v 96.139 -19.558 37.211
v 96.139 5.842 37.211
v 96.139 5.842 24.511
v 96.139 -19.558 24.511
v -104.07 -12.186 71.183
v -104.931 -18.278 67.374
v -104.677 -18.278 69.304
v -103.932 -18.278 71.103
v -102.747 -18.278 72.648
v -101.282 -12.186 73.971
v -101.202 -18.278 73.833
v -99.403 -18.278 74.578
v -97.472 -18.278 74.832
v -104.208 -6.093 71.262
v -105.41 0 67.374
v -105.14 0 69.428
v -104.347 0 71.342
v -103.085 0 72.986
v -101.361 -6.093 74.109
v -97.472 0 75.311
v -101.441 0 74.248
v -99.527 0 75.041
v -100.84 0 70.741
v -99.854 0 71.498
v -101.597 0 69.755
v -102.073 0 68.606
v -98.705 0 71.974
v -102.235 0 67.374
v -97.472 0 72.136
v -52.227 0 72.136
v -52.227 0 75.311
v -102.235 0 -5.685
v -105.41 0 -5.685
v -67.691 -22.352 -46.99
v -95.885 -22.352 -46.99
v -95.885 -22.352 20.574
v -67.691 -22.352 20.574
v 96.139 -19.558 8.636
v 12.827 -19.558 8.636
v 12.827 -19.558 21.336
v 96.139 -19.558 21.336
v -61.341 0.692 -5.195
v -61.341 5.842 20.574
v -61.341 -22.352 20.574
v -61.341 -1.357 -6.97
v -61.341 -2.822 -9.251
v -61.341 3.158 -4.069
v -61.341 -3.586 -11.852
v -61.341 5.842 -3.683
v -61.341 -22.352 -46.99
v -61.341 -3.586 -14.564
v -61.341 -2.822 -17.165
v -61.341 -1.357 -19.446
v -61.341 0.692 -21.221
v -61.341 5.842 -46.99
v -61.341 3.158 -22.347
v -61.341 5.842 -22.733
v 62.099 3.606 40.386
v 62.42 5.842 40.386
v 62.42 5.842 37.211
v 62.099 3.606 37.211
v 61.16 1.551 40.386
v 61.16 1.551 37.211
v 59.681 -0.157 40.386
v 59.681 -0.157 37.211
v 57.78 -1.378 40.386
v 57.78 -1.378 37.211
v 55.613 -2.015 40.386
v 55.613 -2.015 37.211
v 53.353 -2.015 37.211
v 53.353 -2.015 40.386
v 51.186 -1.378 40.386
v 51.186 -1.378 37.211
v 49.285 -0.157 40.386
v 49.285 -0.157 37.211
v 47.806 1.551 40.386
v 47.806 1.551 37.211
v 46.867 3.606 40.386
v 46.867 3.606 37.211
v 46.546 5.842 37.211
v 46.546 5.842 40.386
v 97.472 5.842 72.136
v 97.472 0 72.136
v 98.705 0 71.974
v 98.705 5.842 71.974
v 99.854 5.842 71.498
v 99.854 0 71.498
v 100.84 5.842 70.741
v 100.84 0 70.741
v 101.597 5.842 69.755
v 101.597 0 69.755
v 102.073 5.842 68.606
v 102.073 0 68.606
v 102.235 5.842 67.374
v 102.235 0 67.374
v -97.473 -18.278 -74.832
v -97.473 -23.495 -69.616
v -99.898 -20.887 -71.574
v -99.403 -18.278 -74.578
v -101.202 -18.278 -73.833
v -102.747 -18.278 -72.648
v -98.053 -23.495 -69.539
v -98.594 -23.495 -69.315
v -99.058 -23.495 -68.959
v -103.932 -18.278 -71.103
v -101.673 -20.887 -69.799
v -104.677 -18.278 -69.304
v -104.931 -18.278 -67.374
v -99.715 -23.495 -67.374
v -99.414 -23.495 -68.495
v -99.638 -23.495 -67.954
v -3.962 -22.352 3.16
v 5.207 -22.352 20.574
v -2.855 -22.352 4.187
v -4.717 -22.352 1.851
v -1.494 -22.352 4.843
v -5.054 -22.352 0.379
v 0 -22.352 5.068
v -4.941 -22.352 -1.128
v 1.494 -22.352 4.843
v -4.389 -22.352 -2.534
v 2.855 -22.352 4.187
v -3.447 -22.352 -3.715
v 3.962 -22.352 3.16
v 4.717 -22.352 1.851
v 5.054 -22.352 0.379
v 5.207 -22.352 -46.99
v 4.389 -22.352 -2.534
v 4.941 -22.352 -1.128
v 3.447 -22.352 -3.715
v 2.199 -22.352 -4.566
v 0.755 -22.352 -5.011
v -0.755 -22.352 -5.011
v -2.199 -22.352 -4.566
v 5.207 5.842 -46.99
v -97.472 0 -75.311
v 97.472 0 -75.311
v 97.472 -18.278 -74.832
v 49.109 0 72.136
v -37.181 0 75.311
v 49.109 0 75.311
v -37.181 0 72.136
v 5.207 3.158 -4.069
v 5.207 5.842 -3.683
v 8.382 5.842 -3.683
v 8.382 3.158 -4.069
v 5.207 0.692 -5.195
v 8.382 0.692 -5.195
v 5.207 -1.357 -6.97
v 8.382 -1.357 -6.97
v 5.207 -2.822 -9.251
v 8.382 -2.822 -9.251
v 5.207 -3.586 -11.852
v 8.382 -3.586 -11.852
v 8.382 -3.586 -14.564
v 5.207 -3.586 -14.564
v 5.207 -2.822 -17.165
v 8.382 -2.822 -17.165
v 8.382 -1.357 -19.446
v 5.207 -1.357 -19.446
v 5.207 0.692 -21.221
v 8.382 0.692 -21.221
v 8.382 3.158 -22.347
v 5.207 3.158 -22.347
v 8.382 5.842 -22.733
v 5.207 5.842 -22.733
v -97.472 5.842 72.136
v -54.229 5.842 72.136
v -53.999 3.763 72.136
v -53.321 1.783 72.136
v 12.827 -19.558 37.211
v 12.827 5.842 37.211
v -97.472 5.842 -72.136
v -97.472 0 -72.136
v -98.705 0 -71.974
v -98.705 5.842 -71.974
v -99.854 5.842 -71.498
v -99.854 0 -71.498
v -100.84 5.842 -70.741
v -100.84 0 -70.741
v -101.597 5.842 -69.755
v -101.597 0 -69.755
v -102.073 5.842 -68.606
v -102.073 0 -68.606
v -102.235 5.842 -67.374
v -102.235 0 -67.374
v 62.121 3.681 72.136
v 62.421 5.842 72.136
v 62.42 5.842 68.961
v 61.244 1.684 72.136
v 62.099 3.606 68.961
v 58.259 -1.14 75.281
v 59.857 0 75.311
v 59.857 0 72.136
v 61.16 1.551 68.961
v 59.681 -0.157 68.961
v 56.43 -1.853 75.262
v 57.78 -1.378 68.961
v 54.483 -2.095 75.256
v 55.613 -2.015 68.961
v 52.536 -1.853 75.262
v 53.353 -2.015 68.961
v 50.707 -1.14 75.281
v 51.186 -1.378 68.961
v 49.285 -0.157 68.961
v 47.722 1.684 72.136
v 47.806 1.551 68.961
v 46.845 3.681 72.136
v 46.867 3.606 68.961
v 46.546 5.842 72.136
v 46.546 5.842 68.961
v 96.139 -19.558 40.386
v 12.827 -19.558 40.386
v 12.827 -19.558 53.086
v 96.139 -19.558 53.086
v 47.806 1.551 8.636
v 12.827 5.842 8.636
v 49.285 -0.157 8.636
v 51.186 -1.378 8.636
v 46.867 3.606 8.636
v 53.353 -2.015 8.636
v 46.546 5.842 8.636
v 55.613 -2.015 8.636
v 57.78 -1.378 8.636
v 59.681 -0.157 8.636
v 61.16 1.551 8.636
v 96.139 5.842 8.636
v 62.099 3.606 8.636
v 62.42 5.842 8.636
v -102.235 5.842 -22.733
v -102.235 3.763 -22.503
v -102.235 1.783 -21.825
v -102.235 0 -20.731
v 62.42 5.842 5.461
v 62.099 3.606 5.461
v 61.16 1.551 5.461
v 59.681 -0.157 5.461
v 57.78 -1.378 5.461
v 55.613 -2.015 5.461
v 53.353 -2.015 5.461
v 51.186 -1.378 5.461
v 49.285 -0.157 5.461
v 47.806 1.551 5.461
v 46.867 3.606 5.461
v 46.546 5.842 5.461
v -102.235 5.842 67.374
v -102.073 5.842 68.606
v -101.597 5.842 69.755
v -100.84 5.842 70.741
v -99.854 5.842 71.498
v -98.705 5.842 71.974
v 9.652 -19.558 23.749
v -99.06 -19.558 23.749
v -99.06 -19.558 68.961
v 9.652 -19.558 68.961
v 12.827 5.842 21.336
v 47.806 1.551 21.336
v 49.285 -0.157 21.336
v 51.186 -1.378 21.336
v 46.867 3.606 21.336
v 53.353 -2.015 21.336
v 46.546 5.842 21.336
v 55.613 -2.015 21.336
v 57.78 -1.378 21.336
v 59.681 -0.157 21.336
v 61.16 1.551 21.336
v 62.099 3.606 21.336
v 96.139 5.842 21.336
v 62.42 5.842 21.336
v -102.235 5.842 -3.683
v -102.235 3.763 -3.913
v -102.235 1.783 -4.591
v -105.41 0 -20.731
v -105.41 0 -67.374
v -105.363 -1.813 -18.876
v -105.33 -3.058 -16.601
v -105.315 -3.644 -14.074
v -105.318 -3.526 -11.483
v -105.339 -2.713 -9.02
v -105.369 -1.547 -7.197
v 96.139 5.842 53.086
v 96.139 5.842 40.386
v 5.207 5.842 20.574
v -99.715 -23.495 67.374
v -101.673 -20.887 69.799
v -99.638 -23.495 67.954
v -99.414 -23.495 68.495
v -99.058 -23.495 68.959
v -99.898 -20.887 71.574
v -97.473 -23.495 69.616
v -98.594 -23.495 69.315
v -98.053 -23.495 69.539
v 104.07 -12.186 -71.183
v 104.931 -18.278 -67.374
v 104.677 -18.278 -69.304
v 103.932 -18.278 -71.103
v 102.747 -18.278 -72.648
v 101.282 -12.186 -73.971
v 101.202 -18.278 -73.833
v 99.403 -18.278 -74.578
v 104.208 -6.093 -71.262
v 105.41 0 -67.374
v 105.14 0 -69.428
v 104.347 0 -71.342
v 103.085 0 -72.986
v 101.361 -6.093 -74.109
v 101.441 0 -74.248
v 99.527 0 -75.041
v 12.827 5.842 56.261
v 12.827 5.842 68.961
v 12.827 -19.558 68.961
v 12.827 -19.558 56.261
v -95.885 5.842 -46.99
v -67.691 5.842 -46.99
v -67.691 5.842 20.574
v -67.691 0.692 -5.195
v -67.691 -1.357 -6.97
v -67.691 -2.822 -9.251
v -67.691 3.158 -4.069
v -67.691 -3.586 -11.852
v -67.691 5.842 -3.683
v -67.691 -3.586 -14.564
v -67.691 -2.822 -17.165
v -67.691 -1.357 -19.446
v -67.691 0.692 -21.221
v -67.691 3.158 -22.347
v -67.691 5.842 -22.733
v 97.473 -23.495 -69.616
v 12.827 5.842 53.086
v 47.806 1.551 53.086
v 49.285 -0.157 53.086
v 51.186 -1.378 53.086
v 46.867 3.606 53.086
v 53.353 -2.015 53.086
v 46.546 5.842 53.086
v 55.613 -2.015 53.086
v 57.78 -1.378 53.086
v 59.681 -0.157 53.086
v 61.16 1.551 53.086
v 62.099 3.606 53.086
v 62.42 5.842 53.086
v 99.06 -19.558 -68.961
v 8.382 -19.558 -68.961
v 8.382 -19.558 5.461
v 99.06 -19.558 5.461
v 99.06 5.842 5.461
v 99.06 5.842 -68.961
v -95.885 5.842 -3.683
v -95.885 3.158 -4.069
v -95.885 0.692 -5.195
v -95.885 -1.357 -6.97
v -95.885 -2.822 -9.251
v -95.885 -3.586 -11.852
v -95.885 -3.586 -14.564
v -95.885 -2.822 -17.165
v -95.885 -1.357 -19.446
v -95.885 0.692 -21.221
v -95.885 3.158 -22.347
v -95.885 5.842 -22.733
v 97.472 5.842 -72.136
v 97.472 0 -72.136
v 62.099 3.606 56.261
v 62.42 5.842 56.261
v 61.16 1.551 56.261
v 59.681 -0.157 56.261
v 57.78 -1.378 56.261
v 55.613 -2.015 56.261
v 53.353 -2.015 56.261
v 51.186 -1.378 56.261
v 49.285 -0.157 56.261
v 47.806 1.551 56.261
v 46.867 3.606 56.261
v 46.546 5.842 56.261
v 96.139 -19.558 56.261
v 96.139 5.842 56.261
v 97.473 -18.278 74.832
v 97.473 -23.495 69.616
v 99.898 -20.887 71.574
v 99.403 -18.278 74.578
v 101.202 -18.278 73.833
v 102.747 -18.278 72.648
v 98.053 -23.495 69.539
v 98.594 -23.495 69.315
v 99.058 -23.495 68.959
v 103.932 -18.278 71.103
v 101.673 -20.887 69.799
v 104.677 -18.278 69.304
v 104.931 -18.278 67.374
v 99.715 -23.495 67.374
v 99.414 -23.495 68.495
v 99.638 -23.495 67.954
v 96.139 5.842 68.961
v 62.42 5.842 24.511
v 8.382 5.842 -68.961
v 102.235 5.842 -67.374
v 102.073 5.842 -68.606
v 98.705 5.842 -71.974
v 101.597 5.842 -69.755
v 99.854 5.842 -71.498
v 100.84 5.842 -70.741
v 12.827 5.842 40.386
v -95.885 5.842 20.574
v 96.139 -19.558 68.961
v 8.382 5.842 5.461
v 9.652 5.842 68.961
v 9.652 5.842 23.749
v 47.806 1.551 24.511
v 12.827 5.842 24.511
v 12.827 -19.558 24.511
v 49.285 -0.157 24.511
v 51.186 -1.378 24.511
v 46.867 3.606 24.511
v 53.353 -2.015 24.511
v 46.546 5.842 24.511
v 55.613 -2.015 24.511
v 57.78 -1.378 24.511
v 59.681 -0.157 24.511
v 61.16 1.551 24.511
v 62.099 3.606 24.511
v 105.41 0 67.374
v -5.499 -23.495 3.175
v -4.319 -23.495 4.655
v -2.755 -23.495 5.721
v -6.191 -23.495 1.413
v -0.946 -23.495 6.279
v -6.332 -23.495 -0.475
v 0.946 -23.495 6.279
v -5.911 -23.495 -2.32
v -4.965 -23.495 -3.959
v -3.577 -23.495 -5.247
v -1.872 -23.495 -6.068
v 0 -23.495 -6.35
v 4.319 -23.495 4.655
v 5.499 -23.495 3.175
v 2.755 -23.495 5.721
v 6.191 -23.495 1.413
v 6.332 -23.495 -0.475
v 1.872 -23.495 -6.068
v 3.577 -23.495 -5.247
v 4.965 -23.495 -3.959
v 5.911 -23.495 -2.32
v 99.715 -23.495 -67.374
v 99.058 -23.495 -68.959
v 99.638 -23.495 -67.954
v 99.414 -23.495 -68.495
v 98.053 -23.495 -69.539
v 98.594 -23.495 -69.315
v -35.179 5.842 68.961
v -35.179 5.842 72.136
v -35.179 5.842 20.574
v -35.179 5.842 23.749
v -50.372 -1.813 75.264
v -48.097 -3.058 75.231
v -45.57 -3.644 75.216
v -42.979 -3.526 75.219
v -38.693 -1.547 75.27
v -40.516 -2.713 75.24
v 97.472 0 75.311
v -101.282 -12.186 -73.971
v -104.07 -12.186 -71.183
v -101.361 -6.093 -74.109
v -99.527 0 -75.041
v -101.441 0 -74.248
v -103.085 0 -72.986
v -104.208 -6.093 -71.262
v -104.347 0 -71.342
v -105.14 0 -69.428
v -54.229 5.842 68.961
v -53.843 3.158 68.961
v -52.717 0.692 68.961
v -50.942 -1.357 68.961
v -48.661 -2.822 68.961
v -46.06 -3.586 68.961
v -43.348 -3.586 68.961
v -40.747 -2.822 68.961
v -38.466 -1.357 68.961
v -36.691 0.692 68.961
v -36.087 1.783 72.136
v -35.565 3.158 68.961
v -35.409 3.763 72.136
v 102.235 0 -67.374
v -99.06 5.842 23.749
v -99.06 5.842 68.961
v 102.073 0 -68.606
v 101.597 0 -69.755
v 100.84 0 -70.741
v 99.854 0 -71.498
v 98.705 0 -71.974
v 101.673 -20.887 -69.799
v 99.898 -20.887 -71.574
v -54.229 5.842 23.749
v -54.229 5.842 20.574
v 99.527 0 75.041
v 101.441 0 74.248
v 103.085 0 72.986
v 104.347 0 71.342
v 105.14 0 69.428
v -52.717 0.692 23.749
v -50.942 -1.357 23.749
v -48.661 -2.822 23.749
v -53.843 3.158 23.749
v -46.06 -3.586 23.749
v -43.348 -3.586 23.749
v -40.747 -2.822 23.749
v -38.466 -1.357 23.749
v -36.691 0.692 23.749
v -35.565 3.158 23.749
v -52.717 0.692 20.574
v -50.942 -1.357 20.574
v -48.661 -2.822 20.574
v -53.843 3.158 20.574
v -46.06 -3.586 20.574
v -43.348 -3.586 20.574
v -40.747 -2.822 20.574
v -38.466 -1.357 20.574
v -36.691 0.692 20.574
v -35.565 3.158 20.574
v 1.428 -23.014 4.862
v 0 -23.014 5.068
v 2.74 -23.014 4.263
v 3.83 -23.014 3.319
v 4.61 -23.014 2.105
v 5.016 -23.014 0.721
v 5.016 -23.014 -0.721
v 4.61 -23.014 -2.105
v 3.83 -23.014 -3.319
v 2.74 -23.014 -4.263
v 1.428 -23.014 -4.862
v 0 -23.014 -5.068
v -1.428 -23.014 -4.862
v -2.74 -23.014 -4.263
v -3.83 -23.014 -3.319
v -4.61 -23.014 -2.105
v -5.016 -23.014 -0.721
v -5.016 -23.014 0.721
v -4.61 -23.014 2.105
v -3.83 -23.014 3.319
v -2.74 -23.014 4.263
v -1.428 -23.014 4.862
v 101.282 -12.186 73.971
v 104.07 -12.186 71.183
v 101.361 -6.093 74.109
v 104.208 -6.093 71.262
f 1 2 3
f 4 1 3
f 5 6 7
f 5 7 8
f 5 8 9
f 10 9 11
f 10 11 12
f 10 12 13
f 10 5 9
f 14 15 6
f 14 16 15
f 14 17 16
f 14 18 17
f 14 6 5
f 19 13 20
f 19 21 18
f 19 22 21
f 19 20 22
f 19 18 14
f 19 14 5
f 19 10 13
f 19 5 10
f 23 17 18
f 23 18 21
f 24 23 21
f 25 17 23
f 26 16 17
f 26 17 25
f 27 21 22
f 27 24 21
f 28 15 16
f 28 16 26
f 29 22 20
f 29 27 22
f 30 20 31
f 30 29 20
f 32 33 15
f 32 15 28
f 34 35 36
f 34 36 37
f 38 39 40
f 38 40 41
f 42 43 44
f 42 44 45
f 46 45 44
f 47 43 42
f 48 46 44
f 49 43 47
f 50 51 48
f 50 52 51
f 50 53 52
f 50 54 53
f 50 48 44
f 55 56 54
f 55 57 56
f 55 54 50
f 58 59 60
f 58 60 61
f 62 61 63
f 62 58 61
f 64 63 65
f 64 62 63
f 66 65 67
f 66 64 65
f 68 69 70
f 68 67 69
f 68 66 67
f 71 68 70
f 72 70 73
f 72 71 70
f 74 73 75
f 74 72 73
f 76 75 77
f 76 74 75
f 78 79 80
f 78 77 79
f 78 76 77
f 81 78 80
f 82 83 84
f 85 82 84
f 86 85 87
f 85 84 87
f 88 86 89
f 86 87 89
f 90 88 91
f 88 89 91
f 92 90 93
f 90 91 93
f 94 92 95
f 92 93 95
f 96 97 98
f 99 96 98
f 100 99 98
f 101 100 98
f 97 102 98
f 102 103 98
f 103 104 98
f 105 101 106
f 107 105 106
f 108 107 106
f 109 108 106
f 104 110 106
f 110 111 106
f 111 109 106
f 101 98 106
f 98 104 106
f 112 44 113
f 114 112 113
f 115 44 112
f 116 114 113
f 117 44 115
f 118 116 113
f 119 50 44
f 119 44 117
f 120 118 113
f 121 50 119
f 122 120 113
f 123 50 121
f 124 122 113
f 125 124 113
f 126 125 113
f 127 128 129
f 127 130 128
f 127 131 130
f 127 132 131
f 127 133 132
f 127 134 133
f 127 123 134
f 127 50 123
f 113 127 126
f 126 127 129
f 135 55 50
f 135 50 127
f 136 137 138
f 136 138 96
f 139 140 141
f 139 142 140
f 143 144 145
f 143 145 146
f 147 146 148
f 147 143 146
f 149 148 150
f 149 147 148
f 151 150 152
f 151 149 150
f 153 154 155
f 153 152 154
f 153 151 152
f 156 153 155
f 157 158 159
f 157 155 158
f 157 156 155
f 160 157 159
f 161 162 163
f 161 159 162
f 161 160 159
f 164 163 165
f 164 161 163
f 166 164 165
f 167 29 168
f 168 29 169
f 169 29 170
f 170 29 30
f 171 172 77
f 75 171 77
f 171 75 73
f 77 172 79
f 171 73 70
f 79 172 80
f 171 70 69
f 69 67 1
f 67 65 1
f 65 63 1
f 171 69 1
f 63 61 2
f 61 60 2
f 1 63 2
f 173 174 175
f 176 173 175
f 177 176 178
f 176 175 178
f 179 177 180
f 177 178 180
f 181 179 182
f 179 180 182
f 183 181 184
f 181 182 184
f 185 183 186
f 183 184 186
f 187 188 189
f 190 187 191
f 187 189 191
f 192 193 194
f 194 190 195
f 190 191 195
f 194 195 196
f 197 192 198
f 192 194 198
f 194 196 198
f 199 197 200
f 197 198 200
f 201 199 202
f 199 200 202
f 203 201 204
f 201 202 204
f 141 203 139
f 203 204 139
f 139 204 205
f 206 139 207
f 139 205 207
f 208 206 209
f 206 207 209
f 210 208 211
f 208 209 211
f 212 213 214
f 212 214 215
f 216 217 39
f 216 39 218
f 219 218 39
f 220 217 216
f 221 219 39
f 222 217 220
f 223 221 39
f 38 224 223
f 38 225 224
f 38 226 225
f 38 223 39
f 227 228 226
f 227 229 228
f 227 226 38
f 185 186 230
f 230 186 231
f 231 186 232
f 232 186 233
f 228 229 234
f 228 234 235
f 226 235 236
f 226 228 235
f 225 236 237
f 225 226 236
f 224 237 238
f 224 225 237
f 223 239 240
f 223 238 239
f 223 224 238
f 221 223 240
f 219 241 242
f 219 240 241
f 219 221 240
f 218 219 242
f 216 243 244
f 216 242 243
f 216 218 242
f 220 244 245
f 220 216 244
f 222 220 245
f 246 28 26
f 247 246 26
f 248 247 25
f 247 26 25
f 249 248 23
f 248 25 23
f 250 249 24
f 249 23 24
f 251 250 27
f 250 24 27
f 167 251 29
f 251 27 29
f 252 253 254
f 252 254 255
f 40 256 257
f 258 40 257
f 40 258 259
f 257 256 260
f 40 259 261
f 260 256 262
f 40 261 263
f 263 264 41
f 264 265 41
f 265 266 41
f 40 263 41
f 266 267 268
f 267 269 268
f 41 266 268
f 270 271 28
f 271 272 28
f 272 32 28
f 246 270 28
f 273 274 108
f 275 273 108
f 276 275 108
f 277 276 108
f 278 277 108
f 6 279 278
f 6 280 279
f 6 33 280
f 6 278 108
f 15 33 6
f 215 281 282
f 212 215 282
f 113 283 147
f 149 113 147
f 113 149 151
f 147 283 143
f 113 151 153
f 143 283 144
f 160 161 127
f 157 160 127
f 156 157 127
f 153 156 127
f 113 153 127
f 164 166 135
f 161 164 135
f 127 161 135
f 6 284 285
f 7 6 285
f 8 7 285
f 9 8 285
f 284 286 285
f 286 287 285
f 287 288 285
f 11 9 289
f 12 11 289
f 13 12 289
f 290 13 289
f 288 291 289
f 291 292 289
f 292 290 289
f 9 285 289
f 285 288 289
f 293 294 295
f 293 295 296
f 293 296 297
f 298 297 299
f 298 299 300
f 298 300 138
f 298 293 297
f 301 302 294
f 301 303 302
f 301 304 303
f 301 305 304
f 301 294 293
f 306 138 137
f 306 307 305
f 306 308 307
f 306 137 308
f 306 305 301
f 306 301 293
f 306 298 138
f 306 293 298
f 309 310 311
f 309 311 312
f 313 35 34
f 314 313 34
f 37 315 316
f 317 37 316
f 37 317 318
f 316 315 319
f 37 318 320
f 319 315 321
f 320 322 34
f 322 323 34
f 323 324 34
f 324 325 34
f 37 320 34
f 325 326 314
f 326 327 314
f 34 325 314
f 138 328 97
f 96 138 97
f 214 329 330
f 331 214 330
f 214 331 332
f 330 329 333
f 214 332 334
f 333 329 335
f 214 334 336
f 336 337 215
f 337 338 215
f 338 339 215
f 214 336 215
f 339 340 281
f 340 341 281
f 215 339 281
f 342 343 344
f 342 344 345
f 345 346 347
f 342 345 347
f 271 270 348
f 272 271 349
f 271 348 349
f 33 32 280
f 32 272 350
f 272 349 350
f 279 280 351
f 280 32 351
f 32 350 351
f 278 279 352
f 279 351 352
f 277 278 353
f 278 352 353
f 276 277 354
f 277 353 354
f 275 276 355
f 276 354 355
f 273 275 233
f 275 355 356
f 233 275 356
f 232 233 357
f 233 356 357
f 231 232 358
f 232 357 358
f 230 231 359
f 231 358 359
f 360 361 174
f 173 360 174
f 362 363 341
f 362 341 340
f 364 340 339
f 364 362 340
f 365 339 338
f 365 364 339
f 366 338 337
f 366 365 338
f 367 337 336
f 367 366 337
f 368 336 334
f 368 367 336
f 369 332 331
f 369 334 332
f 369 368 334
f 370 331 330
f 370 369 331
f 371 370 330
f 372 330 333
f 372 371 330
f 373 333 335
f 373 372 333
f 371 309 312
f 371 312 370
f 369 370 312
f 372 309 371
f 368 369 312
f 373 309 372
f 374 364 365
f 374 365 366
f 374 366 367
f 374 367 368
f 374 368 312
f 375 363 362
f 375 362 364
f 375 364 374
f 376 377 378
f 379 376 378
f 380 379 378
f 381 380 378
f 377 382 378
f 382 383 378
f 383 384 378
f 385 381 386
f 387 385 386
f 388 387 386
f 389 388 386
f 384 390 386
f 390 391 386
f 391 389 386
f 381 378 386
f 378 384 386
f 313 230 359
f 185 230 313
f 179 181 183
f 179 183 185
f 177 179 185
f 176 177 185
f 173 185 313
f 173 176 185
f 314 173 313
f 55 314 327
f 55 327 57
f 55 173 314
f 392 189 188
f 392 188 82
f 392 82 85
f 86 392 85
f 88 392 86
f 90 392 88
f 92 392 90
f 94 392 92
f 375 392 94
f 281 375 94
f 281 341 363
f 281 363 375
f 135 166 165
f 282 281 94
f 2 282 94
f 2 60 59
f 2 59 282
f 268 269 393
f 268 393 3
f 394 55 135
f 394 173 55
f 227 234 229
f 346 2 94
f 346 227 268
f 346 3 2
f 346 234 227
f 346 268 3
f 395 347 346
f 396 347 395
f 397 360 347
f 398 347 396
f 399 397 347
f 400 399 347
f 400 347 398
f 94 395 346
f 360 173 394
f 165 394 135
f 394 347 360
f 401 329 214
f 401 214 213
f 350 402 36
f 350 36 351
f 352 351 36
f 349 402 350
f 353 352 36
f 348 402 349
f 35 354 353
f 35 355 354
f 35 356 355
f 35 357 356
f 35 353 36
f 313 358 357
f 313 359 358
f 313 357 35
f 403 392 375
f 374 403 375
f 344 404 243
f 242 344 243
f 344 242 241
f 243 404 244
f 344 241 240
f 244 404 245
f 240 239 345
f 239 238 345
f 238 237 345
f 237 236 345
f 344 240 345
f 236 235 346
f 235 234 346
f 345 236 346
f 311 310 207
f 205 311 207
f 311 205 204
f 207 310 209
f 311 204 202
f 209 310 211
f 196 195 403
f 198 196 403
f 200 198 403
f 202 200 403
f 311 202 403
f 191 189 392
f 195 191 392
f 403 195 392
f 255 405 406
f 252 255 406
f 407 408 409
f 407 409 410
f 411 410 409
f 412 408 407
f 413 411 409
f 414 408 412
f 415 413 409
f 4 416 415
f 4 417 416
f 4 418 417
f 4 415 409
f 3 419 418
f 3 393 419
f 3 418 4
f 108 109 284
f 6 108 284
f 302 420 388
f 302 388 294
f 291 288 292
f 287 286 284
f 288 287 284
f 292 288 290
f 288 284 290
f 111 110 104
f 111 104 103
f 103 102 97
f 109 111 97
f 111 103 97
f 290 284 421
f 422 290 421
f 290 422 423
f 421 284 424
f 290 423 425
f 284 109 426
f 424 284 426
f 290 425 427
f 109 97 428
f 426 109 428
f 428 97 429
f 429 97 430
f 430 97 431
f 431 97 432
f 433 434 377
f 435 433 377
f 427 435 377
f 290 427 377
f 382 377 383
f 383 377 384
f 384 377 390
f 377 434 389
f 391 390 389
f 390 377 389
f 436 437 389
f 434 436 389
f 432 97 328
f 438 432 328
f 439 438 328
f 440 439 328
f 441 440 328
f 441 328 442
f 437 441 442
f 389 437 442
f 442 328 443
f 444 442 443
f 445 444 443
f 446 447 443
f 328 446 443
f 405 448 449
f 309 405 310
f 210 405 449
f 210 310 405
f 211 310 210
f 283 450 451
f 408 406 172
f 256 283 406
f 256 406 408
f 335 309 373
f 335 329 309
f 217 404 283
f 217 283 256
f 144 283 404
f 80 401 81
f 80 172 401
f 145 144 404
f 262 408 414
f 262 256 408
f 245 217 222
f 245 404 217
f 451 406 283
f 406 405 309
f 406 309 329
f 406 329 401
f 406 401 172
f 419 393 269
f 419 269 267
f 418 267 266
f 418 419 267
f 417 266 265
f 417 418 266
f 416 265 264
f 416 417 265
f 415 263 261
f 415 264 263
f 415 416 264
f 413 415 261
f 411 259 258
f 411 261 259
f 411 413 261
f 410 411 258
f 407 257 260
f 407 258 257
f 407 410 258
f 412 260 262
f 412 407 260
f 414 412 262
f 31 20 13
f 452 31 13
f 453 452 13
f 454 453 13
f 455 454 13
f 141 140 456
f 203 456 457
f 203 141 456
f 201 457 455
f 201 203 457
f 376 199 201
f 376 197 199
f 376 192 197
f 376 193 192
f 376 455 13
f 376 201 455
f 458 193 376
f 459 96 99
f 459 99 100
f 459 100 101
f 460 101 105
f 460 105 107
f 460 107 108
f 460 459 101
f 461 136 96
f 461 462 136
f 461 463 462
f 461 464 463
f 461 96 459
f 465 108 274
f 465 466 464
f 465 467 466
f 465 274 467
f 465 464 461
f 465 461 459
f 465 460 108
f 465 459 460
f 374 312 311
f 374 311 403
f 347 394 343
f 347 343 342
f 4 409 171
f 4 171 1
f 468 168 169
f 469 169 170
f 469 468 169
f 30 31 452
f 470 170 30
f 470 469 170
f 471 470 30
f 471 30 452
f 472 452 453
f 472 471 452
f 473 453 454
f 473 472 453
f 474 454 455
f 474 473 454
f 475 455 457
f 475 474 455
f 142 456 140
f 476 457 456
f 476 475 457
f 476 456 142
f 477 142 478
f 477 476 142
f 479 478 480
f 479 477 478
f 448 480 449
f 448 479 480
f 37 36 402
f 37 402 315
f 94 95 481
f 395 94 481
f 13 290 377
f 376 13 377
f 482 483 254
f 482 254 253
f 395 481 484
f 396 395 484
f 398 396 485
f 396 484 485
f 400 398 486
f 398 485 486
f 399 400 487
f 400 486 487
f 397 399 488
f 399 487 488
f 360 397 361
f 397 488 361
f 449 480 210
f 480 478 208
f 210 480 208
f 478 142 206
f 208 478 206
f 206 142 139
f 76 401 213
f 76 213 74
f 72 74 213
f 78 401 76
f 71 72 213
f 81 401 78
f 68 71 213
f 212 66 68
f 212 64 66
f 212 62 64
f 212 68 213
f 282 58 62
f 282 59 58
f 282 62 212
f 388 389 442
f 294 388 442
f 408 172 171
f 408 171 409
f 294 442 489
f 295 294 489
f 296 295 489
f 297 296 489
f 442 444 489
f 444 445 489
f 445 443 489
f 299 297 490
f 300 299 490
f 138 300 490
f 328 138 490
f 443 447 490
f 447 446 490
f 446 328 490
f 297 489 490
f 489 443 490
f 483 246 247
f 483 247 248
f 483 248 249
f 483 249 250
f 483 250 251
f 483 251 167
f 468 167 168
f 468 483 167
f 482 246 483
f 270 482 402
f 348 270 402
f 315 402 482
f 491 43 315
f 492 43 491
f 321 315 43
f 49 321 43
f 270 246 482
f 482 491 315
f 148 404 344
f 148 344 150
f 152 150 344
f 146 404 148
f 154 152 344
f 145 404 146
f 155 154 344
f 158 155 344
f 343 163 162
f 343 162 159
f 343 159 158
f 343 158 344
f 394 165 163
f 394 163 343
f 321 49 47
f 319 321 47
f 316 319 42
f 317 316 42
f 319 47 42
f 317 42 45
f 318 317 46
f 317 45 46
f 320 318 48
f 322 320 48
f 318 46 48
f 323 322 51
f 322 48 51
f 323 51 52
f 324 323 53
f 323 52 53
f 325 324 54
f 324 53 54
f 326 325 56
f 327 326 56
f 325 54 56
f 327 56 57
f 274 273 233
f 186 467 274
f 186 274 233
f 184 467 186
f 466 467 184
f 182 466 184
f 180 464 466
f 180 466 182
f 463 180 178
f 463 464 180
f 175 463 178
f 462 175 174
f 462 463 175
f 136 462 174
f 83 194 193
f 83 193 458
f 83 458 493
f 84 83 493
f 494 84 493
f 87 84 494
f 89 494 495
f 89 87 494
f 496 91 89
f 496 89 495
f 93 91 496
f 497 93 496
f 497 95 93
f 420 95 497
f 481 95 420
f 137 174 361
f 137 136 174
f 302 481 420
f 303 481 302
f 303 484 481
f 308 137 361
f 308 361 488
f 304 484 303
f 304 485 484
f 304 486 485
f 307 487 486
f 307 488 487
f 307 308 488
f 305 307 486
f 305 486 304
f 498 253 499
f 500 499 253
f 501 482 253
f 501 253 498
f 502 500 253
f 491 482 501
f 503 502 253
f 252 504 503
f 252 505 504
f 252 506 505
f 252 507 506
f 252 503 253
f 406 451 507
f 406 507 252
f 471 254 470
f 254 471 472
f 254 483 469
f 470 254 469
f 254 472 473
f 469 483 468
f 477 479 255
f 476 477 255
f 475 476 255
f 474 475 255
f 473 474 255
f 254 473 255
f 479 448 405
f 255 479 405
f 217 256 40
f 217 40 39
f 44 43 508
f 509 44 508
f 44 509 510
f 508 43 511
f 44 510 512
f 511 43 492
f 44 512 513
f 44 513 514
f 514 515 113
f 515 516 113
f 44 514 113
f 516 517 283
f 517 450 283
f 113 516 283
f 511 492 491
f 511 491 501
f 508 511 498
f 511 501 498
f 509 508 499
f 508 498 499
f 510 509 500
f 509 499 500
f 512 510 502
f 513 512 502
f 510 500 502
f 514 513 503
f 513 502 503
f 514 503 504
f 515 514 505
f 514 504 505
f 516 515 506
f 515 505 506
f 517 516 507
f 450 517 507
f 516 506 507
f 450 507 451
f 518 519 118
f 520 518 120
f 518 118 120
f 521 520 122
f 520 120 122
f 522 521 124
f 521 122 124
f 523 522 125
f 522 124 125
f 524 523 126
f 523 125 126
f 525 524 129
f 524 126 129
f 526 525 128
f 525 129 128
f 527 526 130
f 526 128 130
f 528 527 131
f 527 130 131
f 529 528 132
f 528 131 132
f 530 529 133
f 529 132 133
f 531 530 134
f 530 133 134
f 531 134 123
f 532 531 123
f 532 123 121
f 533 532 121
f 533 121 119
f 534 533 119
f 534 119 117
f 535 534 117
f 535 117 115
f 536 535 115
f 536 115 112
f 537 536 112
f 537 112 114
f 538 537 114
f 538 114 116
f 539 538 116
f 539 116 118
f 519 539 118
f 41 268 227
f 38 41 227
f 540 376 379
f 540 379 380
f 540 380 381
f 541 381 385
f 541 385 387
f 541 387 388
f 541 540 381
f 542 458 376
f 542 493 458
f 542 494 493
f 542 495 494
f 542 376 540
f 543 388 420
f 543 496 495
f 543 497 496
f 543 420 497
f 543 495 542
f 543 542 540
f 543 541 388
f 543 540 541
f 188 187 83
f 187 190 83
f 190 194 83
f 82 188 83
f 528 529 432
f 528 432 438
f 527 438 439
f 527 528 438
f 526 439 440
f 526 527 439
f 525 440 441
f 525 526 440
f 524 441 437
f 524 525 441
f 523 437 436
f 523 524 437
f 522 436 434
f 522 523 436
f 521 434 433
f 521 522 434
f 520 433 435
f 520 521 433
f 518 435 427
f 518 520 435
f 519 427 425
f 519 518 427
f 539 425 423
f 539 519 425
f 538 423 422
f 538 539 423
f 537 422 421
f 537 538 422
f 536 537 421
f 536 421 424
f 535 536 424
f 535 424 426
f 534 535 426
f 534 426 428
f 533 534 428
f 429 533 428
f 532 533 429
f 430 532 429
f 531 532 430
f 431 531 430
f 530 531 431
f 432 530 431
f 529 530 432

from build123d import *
from OCP.BRepFilletAPI import BRepFilletAPI_MakeChamfer

# Parameters (mm, degrees)
BOSS_EXTRUDE1_DEPTH            = 23.495
BOSS_EXTRUDE1_DRAFT            = -1.5
CHAMFER1_SIZE                  = 5.21838973
CHAMFER1_SIZE_2                = 5.08
BOSS_EXTRUDE2_DEPTH            = 5.842
SKETCH3_W                      = 108.712
SKETCH3_H                      = 45.212
CUT_EXTRUDE1_DEPTH             = 25.4
SKETCH4_R                      = 6.35
CUT_EXTRUDE2_DEPTH             = 1.524
CHAMFER2_SIZE2                 = 4.064
CHAMFER2_SIZE                  = 1.524
SKETCH5_W                      = 28.194
SKETCH5_H                      = 67.564
SKETCH5_W_2                    = 66.548
CUT_EXTRUDE3_DEPTH             = 28.194
SKETCH6_W                      = 83.312
SKETCH6_H                      = 12.7
CUT_EXTRUDE4_DEPTH             = 25.4
LPATTERN2_COUNT                = 4
LPATTERN2_PITCH                = 15.875
SKETCH8_W                      = 90.678
SKETCH8_H                      = 74.422
CUT_EXTRUDE5_DEPTH             = 25.4
CUT_EXTRUDE6_REACH             = 148.547
SKETCH10_R                     = 9.525
CUT_EXTRUDE6_DIRECTION_2_REACH = 148.547
SKETCH11_R                     = 9.525
CUT_EXTRUDE7_DEPTH             = 185.471292474
CUT_EXTRUDE7_DIRECTION_2_REACH = 186.471
CUT_EXTRUDE8_REACH             = 172.219
CUT_EXTRUDE8_DIRECTION_2_DEPTH = 171.218901151
SKETCH12_R                     = 5.067701835
CUT_EXTRUDE9_DEPTH             = 133.581735005


with BuildPart() as part:
    # Sketch1 → Boss-Extrude1 (with draft: the straight prism first)
    with BuildSketch(Plane(origin=(0, 0, 0), x_dir=(1, 0, 0), z_dir=(0, 1, 0))):
        with BuildLine():
            ThreePointArc((-97.4725, 75.311), (-103.085160076, 72.986160076), (-105.41, 67.3735))
            Line((-105.41, 67.3735), (-105.41, -67.3735))
            ThreePointArc((-105.41, -67.3735), (-103.085160076, -72.986160076), (-97.4725, -75.311))
            Line((-97.4725, -75.311), (97.4725, -75.311))
            ThreePointArc((97.4725, -75.311), (103.085160076, -72.986160076), (105.41, -67.3735))
            Line((105.41, -67.3735), (105.41, 67.3735))
            ThreePointArc((105.41, 67.3735), (103.085160076, 72.986160076), (97.4725, 75.311))
            Line((97.4725, 75.311), (-97.4725, 75.311))
        make_face()
    extrude(amount=-BOSS_EXTRUDE1_DEPTH)
    # Boss-Extrude1: the draft: its side faces are tilted about the plane it starts from
    boss_extrude1_sides = [part.faces().sort_by_distance(p)[0] for p in [
        (-103.085160076, -11.7475, -72.986160076),
        (-105.41, -11.7475, 0),
        (-103.085160076, -11.7475, 72.986160076),
        (0, -11.7475, 75.311),
        (103.085160076, -11.7475, 72.986160076),
        (105.41, -11.7475, 0),
        (103.085160076, -11.7475, -72.986160076),
        (0, -11.7475, -75.311),
    ]]
    draft(boss_extrude1_sides, Plane(origin=(0, 0, 0), x_dir=(1, 0, 0), z_dir=(0, 1, 0)), BOSS_EXTRUDE1_DRAFT)

    # Chamfer1
    chamfer1_edges_1 = [part.edges().sort_by_distance(p)[0] for p in [
        (-102.650120953, -23.495, -72.551120953),
    ]]
    chamfer1_side_1 = [part.faces().sort_by_distance(p)[0] for p in [
        (-102.652001559, -23.393434816, -72.553001559),
    ]]
    chamfer1_edges_2 = [part.edges().sort_by_distance(p)[0] for p in [
        (-104.794761773, -23.495, 0),
    ]]
    chamfer1_side_2 = [part.faces().sort_by_distance(p)[0] for p in [
        (-104.797421351, -23.393434816, 0),
    ]]
    chamfer1_edges_3 = [part.edges().sort_by_distance(p)[0] for p in [
        (-102.650120953, -23.495, 72.551120953),
    ]]
    chamfer1_side_3 = [part.faces().sort_by_distance(p)[0] for p in [
        (-102.652001559, -23.393434816, 72.553001559),
    ]]
    chamfer1_edges_4 = [part.edges().sort_by_distance(p)[0] for p in [
        (0, -23.495, 74.695761773),
    ]]
    chamfer1_side_4 = [part.faces().sort_by_distance(p)[0] for p in [
        (0, -23.393434816, 74.698421351),
    ]]
    chamfer1_edges_5 = [part.edges().sort_by_distance(p)[0] for p in [
        (102.650120953, -23.495, 72.551120953),
    ]]
    chamfer1_side_5 = [part.faces().sort_by_distance(p)[0] for p in [
        (102.652001559, -23.393434816, 72.553001559),
    ]]
    chamfer1_edges_6 = [part.edges().sort_by_distance(p)[0] for p in [
        (104.794761773, -23.495, 0),
    ]]
    chamfer1_side_6 = [part.faces().sort_by_distance(p)[0] for p in [
        (104.797421351, -23.393434816, 0),
    ]]
    chamfer1_edges_7 = [part.edges().sort_by_distance(p)[0] for p in [
        (102.650120953, -23.495, -72.551120953),
    ]]
    chamfer1_side_7 = [part.faces().sort_by_distance(p)[0] for p in [
        (102.652001559, -23.393434816, -72.553001559),
    ]]
    chamfer1_edges_8 = [part.edges().sort_by_distance(p)[0] for p in [
        (0, -23.495, -74.695761773),
    ]]
    chamfer1_side_8 = [part.faces().sort_by_distance(p)[0] for p in [
        (0, -23.393434816, -74.698421351),
    ]]
    chamfer1 = BRepFilletAPI_MakeChamfer(part.part.solid().wrapped)
    for e in chamfer1_edges_1:
        chamfer1.Add(CHAMFER1_SIZE, CHAMFER1_SIZE_2, e.wrapped, chamfer1_side_1[0].wrapped)
    for e in chamfer1_edges_2:
        chamfer1.Add(CHAMFER1_SIZE, CHAMFER1_SIZE_2, e.wrapped, chamfer1_side_2[0].wrapped)
    for e in chamfer1_edges_3:
        chamfer1.Add(CHAMFER1_SIZE, CHAMFER1_SIZE_2, e.wrapped, chamfer1_side_3[0].wrapped)
    for e in chamfer1_edges_4:
        chamfer1.Add(CHAMFER1_SIZE, CHAMFER1_SIZE_2, e.wrapped, chamfer1_side_4[0].wrapped)
    for e in chamfer1_edges_5:
        chamfer1.Add(CHAMFER1_SIZE_2, CHAMFER1_SIZE, e.wrapped, chamfer1_side_5[0].wrapped)
    for e in chamfer1_edges_6:
        chamfer1.Add(CHAMFER1_SIZE, CHAMFER1_SIZE_2, e.wrapped, chamfer1_side_6[0].wrapped)
    for e in chamfer1_edges_7:
        chamfer1.Add(CHAMFER1_SIZE, CHAMFER1_SIZE_2, e.wrapped, chamfer1_side_7[0].wrapped)
    for e in chamfer1_edges_8:
        chamfer1.Add(CHAMFER1_SIZE, CHAMFER1_SIZE_2, e.wrapped, chamfer1_side_8[0].wrapped)
    add(Compound.cast(chamfer1.Shape()), mode=Mode.REPLACE)

    # Sketch2 → Boss-Extrude2 (add)
    with BuildSketch(Plane(origin=(0, 0, 0), x_dir=(1, 0, 0), z_dir=(0, 1, 0))):
        with BuildLine():
            Line((97.4725, 72.136), (-97.4725, 72.136))
            ThreePointArc((-97.4725, 72.136), (-100.840096045, 70.741096045), (-102.235, 67.3735))
            Line((-102.235, 67.3735), (-102.235, -67.3735))
            ThreePointArc((-102.235, -67.3735), (-100.840096045, -70.741096045), (-97.4725, -72.136))
            Line((-97.4725, -72.136), (97.4725, -72.136))
            ThreePointArc((97.4725, -72.136), (100.840096045, -70.741096045), (102.235, -67.3735))
            Line((102.235, -67.3735), (102.235, 67.3735))
            ThreePointArc((102.235, 67.3735), (100.840096045, 70.741096045), (97.4725, 72.136))
        make_face()
    extrude(amount=BOSS_EXTRUDE2_DEPTH)

    # Sketch3 → Cut-Extrude1 (cut)
    with BuildSketch(Plane(origin=(0, 5.842, 0), x_dir=(1, 0, 0), z_dir=(0, 1, 0))):
        with Locations((-44.704, -46.355)):
            Rectangle(SKETCH3_W, SKETCH3_H)
    extrude(amount=-CUT_EXTRUDE1_DEPTH, mode=Mode.SUBTRACT)

    # Sketch4 → Cut-Extrude2 (cut)
    with BuildSketch(Plane.XZ.offset(23.495)):
        with Locations(Location((0, 0, 0), (0, 0, 270))):
            Circle(SKETCH4_R)
    extrude(amount=-CUT_EXTRUDE2_DEPTH, mode=Mode.SUBTRACT)

    # Chamfer2
    chamfer2_edges = [part.edges().sort_by_distance(p)[0] for p in [
        (0, -21.971, 6.35),
    ]]
    chamfer2_side = [part.faces().sort_by_distance(p)[0] for p in [
        (0, -22.00148, 6.35),
    ]]
    chamfer(chamfer2_edges, length=CHAMFER2_SIZE - 0.0001, length2=CHAMFER2_SIZE2 - 0.0001, reference=chamfer2_side[0])  # a hair under: the kernel refuses the full size

    # Sketch5 → Cut-Extrude3 (cut)
    with BuildSketch(Plane(origin=(0, 5.842, 0), x_dir=(1, 0, 0), z_dir=(0, 1, 0))):
        with Locations((-81.788, 13.208)):
            Rectangle(SKETCH5_W, SKETCH5_H)
        with Locations((-28.067, 13.208)):
            Rectangle(SKETCH5_W_2, SKETCH5_H)
    extrude(amount=-CUT_EXTRUDE3_DEPTH, mode=Mode.SUBTRACT)

    # Sketch6 → Cut-Extrude4 (cut)
    with BuildSketch(Plane(origin=(0, 5.842, 0), x_dir=(1, 0, 0), z_dir=(0, 1, 0))):
        with Locations((54.483, -62.611)):
            Rectangle(SKETCH6_W, SKETCH6_H)
    cut_extrude4 = extrude(amount=-CUT_EXTRUDE4_DEPTH, mode=Mode.SUBTRACT)

    # LPattern2: Cut-Extrude4 ×4
    with Locations(*[(0, 0, -i * LPATTERN2_PITCH) for i in range(1, LPATTERN2_COUNT)]):
        add(cut_extrude4, mode=Mode.SUBTRACT)

    # Sketch8 → Cut-Extrude5 (cut)
    with BuildSketch(Plane(origin=(0, 5.842, 0), x_dir=(1, 0, 0), z_dir=(0, 1, 0))):
        with Locations((53.721, 31.75)):
            Rectangle(SKETCH8_W, SKETCH8_H)
    extrude(amount=-CUT_EXTRUDE5_DEPTH, mode=Mode.SUBTRACT)

    # Sketch10 → Cut-Extrude6 (cut, up to next)
    with BuildSketch(Plane.XY.offset(23.749), mode=Mode.PRIVATE) as cut_extrude6_sk1:
        with Locations((-44.704, 5.842)):
            Circle(SKETCH10_R)
    cut_extrude6_tool1 = extrude(cut_extrude6_sk1.sketch, amount=-CUT_EXTRUDE6_REACH, mode=Mode.PRIVATE) & part.part
    add(cut_extrude6_tool1.solids().sort_by_distance((-44.704, 5.842, 23.749))[0], mode=Mode.SUBTRACT)

    # Sketch10 → Cut-Extrude6 direction 2 (cut, up to next)
    with BuildSketch(Plane.XY.offset(23.749), mode=Mode.PRIVATE) as cut_extrude6_direction_2_sk1:
        with Locations((-44.704, 5.842)):
            Circle(SKETCH10_R)
    cut_extrude6_direction_2_tool1 = extrude(cut_extrude6_direction_2_sk1.sketch, amount=CUT_EXTRUDE6_DIRECTION_2_REACH, mode=Mode.PRIVATE) & part.part
    add(cut_extrude6_direction_2_tool1.solids().sort_by_distance((-44.704, 5.842, 23.749))[0], mode=Mode.SUBTRACT)

    # Sketch11 → Cut-Extrude7 (cut)
    with BuildSketch(Plane(origin=(-61.341, 0, 0), x_dir=(0, 0, -1), z_dir=(1, 0, 0))):
        with Locations((13.208, 5.842)):
            Circle(SKETCH11_R)
    extrude(amount=-CUT_EXTRUDE7_DEPTH, mode=Mode.SUBTRACT)

    # Sketch11 → Cut-Extrude7 direction 2 (cut, up to next)
    with BuildSketch(Plane(origin=(-61.341, 0, 0), x_dir=(0, 0, -1), z_dir=(1, 0, 0)), mode=Mode.PRIVATE) as cut_extrude7_direction_2_sk1:
        with Locations((13.208, 5.842)):
            Circle(SKETCH11_R)
    cut_extrude7_direction_2_tool1 = extrude(cut_extrude7_direction_2_sk1.sketch, amount=CUT_EXTRUDE7_DIRECTION_2_REACH, mode=Mode.PRIVATE) & part.part
    add(cut_extrude7_direction_2_tool1.solids().sort_by_distance((-61.341, 5.842, -13.208))[0], mode=Mode.SUBTRACT)

    # Cut-Extrude8: up to this face of the body (flat: up to its plane)
    cut_extrude8_end = Plane(part.part.faces().sort_by_distance((53.721, -6.858, 5.461))[0])
    # Sketch7 → Cut-Extrude8 (cut, up to the picked face)
    with BuildSketch(Plane.XY.offset(56.261), mode=Mode.PRIVATE) as cut_extrude8_sk1:
        with BuildLine():
            Line((46.5455, 5.842), (54.483, 5.842))
            Line((54.483, 5.842), (62.4205, 5.842))
            ThreePointArc((62.4205, 5.842), (54.483, -2.0955), (46.5455, 5.842))
        make_face()
    cut_extrude8_tool1 = split(extrude(cut_extrude8_sk1.sketch, amount=-CUT_EXTRUDE8_REACH, mode=Mode.PRIVATE), bisect_by=cut_extrude8_end, keep=Keep.BOTH, mode=Mode.PRIVATE)
    add(cut_extrude8_tool1.solids().sort_by(Axis((54.483, 2.47322, 56.261), (0, 0, -1)))[0], mode=Mode.SUBTRACT)

    # Sketch7 → Cut-Extrude8 direction 2 (cut)
    with BuildSketch(Plane.XY.offset(56.261)):
        with BuildLine():
            Line((46.5455, 5.842), (54.483, 5.842))
            Line((54.483, 5.842), (62.4205, 5.842))
            ThreePointArc((62.4205, 5.842), (54.483, -2.0955), (46.5455, 5.842))
        make_face()
    extrude(amount=CUT_EXTRUDE8_DIRECTION_2_DEPTH, mode=Mode.SUBTRACT)

    # Sketch12 → Cut-Extrude9 (cut, through all)
    with BuildSketch(Plane(origin=(0, -22.352, 0), x_dir=(1, 0, 0), z_dir=(0, 1, 0))):
        with Locations(Location((0, 0, 0), (0, 0, 270))):
            Circle(SKETCH12_R)
    extrude(amount=-CUT_EXTRUDE9_DEPTH, mode=Mode.SUBTRACT)


solid = part.part
